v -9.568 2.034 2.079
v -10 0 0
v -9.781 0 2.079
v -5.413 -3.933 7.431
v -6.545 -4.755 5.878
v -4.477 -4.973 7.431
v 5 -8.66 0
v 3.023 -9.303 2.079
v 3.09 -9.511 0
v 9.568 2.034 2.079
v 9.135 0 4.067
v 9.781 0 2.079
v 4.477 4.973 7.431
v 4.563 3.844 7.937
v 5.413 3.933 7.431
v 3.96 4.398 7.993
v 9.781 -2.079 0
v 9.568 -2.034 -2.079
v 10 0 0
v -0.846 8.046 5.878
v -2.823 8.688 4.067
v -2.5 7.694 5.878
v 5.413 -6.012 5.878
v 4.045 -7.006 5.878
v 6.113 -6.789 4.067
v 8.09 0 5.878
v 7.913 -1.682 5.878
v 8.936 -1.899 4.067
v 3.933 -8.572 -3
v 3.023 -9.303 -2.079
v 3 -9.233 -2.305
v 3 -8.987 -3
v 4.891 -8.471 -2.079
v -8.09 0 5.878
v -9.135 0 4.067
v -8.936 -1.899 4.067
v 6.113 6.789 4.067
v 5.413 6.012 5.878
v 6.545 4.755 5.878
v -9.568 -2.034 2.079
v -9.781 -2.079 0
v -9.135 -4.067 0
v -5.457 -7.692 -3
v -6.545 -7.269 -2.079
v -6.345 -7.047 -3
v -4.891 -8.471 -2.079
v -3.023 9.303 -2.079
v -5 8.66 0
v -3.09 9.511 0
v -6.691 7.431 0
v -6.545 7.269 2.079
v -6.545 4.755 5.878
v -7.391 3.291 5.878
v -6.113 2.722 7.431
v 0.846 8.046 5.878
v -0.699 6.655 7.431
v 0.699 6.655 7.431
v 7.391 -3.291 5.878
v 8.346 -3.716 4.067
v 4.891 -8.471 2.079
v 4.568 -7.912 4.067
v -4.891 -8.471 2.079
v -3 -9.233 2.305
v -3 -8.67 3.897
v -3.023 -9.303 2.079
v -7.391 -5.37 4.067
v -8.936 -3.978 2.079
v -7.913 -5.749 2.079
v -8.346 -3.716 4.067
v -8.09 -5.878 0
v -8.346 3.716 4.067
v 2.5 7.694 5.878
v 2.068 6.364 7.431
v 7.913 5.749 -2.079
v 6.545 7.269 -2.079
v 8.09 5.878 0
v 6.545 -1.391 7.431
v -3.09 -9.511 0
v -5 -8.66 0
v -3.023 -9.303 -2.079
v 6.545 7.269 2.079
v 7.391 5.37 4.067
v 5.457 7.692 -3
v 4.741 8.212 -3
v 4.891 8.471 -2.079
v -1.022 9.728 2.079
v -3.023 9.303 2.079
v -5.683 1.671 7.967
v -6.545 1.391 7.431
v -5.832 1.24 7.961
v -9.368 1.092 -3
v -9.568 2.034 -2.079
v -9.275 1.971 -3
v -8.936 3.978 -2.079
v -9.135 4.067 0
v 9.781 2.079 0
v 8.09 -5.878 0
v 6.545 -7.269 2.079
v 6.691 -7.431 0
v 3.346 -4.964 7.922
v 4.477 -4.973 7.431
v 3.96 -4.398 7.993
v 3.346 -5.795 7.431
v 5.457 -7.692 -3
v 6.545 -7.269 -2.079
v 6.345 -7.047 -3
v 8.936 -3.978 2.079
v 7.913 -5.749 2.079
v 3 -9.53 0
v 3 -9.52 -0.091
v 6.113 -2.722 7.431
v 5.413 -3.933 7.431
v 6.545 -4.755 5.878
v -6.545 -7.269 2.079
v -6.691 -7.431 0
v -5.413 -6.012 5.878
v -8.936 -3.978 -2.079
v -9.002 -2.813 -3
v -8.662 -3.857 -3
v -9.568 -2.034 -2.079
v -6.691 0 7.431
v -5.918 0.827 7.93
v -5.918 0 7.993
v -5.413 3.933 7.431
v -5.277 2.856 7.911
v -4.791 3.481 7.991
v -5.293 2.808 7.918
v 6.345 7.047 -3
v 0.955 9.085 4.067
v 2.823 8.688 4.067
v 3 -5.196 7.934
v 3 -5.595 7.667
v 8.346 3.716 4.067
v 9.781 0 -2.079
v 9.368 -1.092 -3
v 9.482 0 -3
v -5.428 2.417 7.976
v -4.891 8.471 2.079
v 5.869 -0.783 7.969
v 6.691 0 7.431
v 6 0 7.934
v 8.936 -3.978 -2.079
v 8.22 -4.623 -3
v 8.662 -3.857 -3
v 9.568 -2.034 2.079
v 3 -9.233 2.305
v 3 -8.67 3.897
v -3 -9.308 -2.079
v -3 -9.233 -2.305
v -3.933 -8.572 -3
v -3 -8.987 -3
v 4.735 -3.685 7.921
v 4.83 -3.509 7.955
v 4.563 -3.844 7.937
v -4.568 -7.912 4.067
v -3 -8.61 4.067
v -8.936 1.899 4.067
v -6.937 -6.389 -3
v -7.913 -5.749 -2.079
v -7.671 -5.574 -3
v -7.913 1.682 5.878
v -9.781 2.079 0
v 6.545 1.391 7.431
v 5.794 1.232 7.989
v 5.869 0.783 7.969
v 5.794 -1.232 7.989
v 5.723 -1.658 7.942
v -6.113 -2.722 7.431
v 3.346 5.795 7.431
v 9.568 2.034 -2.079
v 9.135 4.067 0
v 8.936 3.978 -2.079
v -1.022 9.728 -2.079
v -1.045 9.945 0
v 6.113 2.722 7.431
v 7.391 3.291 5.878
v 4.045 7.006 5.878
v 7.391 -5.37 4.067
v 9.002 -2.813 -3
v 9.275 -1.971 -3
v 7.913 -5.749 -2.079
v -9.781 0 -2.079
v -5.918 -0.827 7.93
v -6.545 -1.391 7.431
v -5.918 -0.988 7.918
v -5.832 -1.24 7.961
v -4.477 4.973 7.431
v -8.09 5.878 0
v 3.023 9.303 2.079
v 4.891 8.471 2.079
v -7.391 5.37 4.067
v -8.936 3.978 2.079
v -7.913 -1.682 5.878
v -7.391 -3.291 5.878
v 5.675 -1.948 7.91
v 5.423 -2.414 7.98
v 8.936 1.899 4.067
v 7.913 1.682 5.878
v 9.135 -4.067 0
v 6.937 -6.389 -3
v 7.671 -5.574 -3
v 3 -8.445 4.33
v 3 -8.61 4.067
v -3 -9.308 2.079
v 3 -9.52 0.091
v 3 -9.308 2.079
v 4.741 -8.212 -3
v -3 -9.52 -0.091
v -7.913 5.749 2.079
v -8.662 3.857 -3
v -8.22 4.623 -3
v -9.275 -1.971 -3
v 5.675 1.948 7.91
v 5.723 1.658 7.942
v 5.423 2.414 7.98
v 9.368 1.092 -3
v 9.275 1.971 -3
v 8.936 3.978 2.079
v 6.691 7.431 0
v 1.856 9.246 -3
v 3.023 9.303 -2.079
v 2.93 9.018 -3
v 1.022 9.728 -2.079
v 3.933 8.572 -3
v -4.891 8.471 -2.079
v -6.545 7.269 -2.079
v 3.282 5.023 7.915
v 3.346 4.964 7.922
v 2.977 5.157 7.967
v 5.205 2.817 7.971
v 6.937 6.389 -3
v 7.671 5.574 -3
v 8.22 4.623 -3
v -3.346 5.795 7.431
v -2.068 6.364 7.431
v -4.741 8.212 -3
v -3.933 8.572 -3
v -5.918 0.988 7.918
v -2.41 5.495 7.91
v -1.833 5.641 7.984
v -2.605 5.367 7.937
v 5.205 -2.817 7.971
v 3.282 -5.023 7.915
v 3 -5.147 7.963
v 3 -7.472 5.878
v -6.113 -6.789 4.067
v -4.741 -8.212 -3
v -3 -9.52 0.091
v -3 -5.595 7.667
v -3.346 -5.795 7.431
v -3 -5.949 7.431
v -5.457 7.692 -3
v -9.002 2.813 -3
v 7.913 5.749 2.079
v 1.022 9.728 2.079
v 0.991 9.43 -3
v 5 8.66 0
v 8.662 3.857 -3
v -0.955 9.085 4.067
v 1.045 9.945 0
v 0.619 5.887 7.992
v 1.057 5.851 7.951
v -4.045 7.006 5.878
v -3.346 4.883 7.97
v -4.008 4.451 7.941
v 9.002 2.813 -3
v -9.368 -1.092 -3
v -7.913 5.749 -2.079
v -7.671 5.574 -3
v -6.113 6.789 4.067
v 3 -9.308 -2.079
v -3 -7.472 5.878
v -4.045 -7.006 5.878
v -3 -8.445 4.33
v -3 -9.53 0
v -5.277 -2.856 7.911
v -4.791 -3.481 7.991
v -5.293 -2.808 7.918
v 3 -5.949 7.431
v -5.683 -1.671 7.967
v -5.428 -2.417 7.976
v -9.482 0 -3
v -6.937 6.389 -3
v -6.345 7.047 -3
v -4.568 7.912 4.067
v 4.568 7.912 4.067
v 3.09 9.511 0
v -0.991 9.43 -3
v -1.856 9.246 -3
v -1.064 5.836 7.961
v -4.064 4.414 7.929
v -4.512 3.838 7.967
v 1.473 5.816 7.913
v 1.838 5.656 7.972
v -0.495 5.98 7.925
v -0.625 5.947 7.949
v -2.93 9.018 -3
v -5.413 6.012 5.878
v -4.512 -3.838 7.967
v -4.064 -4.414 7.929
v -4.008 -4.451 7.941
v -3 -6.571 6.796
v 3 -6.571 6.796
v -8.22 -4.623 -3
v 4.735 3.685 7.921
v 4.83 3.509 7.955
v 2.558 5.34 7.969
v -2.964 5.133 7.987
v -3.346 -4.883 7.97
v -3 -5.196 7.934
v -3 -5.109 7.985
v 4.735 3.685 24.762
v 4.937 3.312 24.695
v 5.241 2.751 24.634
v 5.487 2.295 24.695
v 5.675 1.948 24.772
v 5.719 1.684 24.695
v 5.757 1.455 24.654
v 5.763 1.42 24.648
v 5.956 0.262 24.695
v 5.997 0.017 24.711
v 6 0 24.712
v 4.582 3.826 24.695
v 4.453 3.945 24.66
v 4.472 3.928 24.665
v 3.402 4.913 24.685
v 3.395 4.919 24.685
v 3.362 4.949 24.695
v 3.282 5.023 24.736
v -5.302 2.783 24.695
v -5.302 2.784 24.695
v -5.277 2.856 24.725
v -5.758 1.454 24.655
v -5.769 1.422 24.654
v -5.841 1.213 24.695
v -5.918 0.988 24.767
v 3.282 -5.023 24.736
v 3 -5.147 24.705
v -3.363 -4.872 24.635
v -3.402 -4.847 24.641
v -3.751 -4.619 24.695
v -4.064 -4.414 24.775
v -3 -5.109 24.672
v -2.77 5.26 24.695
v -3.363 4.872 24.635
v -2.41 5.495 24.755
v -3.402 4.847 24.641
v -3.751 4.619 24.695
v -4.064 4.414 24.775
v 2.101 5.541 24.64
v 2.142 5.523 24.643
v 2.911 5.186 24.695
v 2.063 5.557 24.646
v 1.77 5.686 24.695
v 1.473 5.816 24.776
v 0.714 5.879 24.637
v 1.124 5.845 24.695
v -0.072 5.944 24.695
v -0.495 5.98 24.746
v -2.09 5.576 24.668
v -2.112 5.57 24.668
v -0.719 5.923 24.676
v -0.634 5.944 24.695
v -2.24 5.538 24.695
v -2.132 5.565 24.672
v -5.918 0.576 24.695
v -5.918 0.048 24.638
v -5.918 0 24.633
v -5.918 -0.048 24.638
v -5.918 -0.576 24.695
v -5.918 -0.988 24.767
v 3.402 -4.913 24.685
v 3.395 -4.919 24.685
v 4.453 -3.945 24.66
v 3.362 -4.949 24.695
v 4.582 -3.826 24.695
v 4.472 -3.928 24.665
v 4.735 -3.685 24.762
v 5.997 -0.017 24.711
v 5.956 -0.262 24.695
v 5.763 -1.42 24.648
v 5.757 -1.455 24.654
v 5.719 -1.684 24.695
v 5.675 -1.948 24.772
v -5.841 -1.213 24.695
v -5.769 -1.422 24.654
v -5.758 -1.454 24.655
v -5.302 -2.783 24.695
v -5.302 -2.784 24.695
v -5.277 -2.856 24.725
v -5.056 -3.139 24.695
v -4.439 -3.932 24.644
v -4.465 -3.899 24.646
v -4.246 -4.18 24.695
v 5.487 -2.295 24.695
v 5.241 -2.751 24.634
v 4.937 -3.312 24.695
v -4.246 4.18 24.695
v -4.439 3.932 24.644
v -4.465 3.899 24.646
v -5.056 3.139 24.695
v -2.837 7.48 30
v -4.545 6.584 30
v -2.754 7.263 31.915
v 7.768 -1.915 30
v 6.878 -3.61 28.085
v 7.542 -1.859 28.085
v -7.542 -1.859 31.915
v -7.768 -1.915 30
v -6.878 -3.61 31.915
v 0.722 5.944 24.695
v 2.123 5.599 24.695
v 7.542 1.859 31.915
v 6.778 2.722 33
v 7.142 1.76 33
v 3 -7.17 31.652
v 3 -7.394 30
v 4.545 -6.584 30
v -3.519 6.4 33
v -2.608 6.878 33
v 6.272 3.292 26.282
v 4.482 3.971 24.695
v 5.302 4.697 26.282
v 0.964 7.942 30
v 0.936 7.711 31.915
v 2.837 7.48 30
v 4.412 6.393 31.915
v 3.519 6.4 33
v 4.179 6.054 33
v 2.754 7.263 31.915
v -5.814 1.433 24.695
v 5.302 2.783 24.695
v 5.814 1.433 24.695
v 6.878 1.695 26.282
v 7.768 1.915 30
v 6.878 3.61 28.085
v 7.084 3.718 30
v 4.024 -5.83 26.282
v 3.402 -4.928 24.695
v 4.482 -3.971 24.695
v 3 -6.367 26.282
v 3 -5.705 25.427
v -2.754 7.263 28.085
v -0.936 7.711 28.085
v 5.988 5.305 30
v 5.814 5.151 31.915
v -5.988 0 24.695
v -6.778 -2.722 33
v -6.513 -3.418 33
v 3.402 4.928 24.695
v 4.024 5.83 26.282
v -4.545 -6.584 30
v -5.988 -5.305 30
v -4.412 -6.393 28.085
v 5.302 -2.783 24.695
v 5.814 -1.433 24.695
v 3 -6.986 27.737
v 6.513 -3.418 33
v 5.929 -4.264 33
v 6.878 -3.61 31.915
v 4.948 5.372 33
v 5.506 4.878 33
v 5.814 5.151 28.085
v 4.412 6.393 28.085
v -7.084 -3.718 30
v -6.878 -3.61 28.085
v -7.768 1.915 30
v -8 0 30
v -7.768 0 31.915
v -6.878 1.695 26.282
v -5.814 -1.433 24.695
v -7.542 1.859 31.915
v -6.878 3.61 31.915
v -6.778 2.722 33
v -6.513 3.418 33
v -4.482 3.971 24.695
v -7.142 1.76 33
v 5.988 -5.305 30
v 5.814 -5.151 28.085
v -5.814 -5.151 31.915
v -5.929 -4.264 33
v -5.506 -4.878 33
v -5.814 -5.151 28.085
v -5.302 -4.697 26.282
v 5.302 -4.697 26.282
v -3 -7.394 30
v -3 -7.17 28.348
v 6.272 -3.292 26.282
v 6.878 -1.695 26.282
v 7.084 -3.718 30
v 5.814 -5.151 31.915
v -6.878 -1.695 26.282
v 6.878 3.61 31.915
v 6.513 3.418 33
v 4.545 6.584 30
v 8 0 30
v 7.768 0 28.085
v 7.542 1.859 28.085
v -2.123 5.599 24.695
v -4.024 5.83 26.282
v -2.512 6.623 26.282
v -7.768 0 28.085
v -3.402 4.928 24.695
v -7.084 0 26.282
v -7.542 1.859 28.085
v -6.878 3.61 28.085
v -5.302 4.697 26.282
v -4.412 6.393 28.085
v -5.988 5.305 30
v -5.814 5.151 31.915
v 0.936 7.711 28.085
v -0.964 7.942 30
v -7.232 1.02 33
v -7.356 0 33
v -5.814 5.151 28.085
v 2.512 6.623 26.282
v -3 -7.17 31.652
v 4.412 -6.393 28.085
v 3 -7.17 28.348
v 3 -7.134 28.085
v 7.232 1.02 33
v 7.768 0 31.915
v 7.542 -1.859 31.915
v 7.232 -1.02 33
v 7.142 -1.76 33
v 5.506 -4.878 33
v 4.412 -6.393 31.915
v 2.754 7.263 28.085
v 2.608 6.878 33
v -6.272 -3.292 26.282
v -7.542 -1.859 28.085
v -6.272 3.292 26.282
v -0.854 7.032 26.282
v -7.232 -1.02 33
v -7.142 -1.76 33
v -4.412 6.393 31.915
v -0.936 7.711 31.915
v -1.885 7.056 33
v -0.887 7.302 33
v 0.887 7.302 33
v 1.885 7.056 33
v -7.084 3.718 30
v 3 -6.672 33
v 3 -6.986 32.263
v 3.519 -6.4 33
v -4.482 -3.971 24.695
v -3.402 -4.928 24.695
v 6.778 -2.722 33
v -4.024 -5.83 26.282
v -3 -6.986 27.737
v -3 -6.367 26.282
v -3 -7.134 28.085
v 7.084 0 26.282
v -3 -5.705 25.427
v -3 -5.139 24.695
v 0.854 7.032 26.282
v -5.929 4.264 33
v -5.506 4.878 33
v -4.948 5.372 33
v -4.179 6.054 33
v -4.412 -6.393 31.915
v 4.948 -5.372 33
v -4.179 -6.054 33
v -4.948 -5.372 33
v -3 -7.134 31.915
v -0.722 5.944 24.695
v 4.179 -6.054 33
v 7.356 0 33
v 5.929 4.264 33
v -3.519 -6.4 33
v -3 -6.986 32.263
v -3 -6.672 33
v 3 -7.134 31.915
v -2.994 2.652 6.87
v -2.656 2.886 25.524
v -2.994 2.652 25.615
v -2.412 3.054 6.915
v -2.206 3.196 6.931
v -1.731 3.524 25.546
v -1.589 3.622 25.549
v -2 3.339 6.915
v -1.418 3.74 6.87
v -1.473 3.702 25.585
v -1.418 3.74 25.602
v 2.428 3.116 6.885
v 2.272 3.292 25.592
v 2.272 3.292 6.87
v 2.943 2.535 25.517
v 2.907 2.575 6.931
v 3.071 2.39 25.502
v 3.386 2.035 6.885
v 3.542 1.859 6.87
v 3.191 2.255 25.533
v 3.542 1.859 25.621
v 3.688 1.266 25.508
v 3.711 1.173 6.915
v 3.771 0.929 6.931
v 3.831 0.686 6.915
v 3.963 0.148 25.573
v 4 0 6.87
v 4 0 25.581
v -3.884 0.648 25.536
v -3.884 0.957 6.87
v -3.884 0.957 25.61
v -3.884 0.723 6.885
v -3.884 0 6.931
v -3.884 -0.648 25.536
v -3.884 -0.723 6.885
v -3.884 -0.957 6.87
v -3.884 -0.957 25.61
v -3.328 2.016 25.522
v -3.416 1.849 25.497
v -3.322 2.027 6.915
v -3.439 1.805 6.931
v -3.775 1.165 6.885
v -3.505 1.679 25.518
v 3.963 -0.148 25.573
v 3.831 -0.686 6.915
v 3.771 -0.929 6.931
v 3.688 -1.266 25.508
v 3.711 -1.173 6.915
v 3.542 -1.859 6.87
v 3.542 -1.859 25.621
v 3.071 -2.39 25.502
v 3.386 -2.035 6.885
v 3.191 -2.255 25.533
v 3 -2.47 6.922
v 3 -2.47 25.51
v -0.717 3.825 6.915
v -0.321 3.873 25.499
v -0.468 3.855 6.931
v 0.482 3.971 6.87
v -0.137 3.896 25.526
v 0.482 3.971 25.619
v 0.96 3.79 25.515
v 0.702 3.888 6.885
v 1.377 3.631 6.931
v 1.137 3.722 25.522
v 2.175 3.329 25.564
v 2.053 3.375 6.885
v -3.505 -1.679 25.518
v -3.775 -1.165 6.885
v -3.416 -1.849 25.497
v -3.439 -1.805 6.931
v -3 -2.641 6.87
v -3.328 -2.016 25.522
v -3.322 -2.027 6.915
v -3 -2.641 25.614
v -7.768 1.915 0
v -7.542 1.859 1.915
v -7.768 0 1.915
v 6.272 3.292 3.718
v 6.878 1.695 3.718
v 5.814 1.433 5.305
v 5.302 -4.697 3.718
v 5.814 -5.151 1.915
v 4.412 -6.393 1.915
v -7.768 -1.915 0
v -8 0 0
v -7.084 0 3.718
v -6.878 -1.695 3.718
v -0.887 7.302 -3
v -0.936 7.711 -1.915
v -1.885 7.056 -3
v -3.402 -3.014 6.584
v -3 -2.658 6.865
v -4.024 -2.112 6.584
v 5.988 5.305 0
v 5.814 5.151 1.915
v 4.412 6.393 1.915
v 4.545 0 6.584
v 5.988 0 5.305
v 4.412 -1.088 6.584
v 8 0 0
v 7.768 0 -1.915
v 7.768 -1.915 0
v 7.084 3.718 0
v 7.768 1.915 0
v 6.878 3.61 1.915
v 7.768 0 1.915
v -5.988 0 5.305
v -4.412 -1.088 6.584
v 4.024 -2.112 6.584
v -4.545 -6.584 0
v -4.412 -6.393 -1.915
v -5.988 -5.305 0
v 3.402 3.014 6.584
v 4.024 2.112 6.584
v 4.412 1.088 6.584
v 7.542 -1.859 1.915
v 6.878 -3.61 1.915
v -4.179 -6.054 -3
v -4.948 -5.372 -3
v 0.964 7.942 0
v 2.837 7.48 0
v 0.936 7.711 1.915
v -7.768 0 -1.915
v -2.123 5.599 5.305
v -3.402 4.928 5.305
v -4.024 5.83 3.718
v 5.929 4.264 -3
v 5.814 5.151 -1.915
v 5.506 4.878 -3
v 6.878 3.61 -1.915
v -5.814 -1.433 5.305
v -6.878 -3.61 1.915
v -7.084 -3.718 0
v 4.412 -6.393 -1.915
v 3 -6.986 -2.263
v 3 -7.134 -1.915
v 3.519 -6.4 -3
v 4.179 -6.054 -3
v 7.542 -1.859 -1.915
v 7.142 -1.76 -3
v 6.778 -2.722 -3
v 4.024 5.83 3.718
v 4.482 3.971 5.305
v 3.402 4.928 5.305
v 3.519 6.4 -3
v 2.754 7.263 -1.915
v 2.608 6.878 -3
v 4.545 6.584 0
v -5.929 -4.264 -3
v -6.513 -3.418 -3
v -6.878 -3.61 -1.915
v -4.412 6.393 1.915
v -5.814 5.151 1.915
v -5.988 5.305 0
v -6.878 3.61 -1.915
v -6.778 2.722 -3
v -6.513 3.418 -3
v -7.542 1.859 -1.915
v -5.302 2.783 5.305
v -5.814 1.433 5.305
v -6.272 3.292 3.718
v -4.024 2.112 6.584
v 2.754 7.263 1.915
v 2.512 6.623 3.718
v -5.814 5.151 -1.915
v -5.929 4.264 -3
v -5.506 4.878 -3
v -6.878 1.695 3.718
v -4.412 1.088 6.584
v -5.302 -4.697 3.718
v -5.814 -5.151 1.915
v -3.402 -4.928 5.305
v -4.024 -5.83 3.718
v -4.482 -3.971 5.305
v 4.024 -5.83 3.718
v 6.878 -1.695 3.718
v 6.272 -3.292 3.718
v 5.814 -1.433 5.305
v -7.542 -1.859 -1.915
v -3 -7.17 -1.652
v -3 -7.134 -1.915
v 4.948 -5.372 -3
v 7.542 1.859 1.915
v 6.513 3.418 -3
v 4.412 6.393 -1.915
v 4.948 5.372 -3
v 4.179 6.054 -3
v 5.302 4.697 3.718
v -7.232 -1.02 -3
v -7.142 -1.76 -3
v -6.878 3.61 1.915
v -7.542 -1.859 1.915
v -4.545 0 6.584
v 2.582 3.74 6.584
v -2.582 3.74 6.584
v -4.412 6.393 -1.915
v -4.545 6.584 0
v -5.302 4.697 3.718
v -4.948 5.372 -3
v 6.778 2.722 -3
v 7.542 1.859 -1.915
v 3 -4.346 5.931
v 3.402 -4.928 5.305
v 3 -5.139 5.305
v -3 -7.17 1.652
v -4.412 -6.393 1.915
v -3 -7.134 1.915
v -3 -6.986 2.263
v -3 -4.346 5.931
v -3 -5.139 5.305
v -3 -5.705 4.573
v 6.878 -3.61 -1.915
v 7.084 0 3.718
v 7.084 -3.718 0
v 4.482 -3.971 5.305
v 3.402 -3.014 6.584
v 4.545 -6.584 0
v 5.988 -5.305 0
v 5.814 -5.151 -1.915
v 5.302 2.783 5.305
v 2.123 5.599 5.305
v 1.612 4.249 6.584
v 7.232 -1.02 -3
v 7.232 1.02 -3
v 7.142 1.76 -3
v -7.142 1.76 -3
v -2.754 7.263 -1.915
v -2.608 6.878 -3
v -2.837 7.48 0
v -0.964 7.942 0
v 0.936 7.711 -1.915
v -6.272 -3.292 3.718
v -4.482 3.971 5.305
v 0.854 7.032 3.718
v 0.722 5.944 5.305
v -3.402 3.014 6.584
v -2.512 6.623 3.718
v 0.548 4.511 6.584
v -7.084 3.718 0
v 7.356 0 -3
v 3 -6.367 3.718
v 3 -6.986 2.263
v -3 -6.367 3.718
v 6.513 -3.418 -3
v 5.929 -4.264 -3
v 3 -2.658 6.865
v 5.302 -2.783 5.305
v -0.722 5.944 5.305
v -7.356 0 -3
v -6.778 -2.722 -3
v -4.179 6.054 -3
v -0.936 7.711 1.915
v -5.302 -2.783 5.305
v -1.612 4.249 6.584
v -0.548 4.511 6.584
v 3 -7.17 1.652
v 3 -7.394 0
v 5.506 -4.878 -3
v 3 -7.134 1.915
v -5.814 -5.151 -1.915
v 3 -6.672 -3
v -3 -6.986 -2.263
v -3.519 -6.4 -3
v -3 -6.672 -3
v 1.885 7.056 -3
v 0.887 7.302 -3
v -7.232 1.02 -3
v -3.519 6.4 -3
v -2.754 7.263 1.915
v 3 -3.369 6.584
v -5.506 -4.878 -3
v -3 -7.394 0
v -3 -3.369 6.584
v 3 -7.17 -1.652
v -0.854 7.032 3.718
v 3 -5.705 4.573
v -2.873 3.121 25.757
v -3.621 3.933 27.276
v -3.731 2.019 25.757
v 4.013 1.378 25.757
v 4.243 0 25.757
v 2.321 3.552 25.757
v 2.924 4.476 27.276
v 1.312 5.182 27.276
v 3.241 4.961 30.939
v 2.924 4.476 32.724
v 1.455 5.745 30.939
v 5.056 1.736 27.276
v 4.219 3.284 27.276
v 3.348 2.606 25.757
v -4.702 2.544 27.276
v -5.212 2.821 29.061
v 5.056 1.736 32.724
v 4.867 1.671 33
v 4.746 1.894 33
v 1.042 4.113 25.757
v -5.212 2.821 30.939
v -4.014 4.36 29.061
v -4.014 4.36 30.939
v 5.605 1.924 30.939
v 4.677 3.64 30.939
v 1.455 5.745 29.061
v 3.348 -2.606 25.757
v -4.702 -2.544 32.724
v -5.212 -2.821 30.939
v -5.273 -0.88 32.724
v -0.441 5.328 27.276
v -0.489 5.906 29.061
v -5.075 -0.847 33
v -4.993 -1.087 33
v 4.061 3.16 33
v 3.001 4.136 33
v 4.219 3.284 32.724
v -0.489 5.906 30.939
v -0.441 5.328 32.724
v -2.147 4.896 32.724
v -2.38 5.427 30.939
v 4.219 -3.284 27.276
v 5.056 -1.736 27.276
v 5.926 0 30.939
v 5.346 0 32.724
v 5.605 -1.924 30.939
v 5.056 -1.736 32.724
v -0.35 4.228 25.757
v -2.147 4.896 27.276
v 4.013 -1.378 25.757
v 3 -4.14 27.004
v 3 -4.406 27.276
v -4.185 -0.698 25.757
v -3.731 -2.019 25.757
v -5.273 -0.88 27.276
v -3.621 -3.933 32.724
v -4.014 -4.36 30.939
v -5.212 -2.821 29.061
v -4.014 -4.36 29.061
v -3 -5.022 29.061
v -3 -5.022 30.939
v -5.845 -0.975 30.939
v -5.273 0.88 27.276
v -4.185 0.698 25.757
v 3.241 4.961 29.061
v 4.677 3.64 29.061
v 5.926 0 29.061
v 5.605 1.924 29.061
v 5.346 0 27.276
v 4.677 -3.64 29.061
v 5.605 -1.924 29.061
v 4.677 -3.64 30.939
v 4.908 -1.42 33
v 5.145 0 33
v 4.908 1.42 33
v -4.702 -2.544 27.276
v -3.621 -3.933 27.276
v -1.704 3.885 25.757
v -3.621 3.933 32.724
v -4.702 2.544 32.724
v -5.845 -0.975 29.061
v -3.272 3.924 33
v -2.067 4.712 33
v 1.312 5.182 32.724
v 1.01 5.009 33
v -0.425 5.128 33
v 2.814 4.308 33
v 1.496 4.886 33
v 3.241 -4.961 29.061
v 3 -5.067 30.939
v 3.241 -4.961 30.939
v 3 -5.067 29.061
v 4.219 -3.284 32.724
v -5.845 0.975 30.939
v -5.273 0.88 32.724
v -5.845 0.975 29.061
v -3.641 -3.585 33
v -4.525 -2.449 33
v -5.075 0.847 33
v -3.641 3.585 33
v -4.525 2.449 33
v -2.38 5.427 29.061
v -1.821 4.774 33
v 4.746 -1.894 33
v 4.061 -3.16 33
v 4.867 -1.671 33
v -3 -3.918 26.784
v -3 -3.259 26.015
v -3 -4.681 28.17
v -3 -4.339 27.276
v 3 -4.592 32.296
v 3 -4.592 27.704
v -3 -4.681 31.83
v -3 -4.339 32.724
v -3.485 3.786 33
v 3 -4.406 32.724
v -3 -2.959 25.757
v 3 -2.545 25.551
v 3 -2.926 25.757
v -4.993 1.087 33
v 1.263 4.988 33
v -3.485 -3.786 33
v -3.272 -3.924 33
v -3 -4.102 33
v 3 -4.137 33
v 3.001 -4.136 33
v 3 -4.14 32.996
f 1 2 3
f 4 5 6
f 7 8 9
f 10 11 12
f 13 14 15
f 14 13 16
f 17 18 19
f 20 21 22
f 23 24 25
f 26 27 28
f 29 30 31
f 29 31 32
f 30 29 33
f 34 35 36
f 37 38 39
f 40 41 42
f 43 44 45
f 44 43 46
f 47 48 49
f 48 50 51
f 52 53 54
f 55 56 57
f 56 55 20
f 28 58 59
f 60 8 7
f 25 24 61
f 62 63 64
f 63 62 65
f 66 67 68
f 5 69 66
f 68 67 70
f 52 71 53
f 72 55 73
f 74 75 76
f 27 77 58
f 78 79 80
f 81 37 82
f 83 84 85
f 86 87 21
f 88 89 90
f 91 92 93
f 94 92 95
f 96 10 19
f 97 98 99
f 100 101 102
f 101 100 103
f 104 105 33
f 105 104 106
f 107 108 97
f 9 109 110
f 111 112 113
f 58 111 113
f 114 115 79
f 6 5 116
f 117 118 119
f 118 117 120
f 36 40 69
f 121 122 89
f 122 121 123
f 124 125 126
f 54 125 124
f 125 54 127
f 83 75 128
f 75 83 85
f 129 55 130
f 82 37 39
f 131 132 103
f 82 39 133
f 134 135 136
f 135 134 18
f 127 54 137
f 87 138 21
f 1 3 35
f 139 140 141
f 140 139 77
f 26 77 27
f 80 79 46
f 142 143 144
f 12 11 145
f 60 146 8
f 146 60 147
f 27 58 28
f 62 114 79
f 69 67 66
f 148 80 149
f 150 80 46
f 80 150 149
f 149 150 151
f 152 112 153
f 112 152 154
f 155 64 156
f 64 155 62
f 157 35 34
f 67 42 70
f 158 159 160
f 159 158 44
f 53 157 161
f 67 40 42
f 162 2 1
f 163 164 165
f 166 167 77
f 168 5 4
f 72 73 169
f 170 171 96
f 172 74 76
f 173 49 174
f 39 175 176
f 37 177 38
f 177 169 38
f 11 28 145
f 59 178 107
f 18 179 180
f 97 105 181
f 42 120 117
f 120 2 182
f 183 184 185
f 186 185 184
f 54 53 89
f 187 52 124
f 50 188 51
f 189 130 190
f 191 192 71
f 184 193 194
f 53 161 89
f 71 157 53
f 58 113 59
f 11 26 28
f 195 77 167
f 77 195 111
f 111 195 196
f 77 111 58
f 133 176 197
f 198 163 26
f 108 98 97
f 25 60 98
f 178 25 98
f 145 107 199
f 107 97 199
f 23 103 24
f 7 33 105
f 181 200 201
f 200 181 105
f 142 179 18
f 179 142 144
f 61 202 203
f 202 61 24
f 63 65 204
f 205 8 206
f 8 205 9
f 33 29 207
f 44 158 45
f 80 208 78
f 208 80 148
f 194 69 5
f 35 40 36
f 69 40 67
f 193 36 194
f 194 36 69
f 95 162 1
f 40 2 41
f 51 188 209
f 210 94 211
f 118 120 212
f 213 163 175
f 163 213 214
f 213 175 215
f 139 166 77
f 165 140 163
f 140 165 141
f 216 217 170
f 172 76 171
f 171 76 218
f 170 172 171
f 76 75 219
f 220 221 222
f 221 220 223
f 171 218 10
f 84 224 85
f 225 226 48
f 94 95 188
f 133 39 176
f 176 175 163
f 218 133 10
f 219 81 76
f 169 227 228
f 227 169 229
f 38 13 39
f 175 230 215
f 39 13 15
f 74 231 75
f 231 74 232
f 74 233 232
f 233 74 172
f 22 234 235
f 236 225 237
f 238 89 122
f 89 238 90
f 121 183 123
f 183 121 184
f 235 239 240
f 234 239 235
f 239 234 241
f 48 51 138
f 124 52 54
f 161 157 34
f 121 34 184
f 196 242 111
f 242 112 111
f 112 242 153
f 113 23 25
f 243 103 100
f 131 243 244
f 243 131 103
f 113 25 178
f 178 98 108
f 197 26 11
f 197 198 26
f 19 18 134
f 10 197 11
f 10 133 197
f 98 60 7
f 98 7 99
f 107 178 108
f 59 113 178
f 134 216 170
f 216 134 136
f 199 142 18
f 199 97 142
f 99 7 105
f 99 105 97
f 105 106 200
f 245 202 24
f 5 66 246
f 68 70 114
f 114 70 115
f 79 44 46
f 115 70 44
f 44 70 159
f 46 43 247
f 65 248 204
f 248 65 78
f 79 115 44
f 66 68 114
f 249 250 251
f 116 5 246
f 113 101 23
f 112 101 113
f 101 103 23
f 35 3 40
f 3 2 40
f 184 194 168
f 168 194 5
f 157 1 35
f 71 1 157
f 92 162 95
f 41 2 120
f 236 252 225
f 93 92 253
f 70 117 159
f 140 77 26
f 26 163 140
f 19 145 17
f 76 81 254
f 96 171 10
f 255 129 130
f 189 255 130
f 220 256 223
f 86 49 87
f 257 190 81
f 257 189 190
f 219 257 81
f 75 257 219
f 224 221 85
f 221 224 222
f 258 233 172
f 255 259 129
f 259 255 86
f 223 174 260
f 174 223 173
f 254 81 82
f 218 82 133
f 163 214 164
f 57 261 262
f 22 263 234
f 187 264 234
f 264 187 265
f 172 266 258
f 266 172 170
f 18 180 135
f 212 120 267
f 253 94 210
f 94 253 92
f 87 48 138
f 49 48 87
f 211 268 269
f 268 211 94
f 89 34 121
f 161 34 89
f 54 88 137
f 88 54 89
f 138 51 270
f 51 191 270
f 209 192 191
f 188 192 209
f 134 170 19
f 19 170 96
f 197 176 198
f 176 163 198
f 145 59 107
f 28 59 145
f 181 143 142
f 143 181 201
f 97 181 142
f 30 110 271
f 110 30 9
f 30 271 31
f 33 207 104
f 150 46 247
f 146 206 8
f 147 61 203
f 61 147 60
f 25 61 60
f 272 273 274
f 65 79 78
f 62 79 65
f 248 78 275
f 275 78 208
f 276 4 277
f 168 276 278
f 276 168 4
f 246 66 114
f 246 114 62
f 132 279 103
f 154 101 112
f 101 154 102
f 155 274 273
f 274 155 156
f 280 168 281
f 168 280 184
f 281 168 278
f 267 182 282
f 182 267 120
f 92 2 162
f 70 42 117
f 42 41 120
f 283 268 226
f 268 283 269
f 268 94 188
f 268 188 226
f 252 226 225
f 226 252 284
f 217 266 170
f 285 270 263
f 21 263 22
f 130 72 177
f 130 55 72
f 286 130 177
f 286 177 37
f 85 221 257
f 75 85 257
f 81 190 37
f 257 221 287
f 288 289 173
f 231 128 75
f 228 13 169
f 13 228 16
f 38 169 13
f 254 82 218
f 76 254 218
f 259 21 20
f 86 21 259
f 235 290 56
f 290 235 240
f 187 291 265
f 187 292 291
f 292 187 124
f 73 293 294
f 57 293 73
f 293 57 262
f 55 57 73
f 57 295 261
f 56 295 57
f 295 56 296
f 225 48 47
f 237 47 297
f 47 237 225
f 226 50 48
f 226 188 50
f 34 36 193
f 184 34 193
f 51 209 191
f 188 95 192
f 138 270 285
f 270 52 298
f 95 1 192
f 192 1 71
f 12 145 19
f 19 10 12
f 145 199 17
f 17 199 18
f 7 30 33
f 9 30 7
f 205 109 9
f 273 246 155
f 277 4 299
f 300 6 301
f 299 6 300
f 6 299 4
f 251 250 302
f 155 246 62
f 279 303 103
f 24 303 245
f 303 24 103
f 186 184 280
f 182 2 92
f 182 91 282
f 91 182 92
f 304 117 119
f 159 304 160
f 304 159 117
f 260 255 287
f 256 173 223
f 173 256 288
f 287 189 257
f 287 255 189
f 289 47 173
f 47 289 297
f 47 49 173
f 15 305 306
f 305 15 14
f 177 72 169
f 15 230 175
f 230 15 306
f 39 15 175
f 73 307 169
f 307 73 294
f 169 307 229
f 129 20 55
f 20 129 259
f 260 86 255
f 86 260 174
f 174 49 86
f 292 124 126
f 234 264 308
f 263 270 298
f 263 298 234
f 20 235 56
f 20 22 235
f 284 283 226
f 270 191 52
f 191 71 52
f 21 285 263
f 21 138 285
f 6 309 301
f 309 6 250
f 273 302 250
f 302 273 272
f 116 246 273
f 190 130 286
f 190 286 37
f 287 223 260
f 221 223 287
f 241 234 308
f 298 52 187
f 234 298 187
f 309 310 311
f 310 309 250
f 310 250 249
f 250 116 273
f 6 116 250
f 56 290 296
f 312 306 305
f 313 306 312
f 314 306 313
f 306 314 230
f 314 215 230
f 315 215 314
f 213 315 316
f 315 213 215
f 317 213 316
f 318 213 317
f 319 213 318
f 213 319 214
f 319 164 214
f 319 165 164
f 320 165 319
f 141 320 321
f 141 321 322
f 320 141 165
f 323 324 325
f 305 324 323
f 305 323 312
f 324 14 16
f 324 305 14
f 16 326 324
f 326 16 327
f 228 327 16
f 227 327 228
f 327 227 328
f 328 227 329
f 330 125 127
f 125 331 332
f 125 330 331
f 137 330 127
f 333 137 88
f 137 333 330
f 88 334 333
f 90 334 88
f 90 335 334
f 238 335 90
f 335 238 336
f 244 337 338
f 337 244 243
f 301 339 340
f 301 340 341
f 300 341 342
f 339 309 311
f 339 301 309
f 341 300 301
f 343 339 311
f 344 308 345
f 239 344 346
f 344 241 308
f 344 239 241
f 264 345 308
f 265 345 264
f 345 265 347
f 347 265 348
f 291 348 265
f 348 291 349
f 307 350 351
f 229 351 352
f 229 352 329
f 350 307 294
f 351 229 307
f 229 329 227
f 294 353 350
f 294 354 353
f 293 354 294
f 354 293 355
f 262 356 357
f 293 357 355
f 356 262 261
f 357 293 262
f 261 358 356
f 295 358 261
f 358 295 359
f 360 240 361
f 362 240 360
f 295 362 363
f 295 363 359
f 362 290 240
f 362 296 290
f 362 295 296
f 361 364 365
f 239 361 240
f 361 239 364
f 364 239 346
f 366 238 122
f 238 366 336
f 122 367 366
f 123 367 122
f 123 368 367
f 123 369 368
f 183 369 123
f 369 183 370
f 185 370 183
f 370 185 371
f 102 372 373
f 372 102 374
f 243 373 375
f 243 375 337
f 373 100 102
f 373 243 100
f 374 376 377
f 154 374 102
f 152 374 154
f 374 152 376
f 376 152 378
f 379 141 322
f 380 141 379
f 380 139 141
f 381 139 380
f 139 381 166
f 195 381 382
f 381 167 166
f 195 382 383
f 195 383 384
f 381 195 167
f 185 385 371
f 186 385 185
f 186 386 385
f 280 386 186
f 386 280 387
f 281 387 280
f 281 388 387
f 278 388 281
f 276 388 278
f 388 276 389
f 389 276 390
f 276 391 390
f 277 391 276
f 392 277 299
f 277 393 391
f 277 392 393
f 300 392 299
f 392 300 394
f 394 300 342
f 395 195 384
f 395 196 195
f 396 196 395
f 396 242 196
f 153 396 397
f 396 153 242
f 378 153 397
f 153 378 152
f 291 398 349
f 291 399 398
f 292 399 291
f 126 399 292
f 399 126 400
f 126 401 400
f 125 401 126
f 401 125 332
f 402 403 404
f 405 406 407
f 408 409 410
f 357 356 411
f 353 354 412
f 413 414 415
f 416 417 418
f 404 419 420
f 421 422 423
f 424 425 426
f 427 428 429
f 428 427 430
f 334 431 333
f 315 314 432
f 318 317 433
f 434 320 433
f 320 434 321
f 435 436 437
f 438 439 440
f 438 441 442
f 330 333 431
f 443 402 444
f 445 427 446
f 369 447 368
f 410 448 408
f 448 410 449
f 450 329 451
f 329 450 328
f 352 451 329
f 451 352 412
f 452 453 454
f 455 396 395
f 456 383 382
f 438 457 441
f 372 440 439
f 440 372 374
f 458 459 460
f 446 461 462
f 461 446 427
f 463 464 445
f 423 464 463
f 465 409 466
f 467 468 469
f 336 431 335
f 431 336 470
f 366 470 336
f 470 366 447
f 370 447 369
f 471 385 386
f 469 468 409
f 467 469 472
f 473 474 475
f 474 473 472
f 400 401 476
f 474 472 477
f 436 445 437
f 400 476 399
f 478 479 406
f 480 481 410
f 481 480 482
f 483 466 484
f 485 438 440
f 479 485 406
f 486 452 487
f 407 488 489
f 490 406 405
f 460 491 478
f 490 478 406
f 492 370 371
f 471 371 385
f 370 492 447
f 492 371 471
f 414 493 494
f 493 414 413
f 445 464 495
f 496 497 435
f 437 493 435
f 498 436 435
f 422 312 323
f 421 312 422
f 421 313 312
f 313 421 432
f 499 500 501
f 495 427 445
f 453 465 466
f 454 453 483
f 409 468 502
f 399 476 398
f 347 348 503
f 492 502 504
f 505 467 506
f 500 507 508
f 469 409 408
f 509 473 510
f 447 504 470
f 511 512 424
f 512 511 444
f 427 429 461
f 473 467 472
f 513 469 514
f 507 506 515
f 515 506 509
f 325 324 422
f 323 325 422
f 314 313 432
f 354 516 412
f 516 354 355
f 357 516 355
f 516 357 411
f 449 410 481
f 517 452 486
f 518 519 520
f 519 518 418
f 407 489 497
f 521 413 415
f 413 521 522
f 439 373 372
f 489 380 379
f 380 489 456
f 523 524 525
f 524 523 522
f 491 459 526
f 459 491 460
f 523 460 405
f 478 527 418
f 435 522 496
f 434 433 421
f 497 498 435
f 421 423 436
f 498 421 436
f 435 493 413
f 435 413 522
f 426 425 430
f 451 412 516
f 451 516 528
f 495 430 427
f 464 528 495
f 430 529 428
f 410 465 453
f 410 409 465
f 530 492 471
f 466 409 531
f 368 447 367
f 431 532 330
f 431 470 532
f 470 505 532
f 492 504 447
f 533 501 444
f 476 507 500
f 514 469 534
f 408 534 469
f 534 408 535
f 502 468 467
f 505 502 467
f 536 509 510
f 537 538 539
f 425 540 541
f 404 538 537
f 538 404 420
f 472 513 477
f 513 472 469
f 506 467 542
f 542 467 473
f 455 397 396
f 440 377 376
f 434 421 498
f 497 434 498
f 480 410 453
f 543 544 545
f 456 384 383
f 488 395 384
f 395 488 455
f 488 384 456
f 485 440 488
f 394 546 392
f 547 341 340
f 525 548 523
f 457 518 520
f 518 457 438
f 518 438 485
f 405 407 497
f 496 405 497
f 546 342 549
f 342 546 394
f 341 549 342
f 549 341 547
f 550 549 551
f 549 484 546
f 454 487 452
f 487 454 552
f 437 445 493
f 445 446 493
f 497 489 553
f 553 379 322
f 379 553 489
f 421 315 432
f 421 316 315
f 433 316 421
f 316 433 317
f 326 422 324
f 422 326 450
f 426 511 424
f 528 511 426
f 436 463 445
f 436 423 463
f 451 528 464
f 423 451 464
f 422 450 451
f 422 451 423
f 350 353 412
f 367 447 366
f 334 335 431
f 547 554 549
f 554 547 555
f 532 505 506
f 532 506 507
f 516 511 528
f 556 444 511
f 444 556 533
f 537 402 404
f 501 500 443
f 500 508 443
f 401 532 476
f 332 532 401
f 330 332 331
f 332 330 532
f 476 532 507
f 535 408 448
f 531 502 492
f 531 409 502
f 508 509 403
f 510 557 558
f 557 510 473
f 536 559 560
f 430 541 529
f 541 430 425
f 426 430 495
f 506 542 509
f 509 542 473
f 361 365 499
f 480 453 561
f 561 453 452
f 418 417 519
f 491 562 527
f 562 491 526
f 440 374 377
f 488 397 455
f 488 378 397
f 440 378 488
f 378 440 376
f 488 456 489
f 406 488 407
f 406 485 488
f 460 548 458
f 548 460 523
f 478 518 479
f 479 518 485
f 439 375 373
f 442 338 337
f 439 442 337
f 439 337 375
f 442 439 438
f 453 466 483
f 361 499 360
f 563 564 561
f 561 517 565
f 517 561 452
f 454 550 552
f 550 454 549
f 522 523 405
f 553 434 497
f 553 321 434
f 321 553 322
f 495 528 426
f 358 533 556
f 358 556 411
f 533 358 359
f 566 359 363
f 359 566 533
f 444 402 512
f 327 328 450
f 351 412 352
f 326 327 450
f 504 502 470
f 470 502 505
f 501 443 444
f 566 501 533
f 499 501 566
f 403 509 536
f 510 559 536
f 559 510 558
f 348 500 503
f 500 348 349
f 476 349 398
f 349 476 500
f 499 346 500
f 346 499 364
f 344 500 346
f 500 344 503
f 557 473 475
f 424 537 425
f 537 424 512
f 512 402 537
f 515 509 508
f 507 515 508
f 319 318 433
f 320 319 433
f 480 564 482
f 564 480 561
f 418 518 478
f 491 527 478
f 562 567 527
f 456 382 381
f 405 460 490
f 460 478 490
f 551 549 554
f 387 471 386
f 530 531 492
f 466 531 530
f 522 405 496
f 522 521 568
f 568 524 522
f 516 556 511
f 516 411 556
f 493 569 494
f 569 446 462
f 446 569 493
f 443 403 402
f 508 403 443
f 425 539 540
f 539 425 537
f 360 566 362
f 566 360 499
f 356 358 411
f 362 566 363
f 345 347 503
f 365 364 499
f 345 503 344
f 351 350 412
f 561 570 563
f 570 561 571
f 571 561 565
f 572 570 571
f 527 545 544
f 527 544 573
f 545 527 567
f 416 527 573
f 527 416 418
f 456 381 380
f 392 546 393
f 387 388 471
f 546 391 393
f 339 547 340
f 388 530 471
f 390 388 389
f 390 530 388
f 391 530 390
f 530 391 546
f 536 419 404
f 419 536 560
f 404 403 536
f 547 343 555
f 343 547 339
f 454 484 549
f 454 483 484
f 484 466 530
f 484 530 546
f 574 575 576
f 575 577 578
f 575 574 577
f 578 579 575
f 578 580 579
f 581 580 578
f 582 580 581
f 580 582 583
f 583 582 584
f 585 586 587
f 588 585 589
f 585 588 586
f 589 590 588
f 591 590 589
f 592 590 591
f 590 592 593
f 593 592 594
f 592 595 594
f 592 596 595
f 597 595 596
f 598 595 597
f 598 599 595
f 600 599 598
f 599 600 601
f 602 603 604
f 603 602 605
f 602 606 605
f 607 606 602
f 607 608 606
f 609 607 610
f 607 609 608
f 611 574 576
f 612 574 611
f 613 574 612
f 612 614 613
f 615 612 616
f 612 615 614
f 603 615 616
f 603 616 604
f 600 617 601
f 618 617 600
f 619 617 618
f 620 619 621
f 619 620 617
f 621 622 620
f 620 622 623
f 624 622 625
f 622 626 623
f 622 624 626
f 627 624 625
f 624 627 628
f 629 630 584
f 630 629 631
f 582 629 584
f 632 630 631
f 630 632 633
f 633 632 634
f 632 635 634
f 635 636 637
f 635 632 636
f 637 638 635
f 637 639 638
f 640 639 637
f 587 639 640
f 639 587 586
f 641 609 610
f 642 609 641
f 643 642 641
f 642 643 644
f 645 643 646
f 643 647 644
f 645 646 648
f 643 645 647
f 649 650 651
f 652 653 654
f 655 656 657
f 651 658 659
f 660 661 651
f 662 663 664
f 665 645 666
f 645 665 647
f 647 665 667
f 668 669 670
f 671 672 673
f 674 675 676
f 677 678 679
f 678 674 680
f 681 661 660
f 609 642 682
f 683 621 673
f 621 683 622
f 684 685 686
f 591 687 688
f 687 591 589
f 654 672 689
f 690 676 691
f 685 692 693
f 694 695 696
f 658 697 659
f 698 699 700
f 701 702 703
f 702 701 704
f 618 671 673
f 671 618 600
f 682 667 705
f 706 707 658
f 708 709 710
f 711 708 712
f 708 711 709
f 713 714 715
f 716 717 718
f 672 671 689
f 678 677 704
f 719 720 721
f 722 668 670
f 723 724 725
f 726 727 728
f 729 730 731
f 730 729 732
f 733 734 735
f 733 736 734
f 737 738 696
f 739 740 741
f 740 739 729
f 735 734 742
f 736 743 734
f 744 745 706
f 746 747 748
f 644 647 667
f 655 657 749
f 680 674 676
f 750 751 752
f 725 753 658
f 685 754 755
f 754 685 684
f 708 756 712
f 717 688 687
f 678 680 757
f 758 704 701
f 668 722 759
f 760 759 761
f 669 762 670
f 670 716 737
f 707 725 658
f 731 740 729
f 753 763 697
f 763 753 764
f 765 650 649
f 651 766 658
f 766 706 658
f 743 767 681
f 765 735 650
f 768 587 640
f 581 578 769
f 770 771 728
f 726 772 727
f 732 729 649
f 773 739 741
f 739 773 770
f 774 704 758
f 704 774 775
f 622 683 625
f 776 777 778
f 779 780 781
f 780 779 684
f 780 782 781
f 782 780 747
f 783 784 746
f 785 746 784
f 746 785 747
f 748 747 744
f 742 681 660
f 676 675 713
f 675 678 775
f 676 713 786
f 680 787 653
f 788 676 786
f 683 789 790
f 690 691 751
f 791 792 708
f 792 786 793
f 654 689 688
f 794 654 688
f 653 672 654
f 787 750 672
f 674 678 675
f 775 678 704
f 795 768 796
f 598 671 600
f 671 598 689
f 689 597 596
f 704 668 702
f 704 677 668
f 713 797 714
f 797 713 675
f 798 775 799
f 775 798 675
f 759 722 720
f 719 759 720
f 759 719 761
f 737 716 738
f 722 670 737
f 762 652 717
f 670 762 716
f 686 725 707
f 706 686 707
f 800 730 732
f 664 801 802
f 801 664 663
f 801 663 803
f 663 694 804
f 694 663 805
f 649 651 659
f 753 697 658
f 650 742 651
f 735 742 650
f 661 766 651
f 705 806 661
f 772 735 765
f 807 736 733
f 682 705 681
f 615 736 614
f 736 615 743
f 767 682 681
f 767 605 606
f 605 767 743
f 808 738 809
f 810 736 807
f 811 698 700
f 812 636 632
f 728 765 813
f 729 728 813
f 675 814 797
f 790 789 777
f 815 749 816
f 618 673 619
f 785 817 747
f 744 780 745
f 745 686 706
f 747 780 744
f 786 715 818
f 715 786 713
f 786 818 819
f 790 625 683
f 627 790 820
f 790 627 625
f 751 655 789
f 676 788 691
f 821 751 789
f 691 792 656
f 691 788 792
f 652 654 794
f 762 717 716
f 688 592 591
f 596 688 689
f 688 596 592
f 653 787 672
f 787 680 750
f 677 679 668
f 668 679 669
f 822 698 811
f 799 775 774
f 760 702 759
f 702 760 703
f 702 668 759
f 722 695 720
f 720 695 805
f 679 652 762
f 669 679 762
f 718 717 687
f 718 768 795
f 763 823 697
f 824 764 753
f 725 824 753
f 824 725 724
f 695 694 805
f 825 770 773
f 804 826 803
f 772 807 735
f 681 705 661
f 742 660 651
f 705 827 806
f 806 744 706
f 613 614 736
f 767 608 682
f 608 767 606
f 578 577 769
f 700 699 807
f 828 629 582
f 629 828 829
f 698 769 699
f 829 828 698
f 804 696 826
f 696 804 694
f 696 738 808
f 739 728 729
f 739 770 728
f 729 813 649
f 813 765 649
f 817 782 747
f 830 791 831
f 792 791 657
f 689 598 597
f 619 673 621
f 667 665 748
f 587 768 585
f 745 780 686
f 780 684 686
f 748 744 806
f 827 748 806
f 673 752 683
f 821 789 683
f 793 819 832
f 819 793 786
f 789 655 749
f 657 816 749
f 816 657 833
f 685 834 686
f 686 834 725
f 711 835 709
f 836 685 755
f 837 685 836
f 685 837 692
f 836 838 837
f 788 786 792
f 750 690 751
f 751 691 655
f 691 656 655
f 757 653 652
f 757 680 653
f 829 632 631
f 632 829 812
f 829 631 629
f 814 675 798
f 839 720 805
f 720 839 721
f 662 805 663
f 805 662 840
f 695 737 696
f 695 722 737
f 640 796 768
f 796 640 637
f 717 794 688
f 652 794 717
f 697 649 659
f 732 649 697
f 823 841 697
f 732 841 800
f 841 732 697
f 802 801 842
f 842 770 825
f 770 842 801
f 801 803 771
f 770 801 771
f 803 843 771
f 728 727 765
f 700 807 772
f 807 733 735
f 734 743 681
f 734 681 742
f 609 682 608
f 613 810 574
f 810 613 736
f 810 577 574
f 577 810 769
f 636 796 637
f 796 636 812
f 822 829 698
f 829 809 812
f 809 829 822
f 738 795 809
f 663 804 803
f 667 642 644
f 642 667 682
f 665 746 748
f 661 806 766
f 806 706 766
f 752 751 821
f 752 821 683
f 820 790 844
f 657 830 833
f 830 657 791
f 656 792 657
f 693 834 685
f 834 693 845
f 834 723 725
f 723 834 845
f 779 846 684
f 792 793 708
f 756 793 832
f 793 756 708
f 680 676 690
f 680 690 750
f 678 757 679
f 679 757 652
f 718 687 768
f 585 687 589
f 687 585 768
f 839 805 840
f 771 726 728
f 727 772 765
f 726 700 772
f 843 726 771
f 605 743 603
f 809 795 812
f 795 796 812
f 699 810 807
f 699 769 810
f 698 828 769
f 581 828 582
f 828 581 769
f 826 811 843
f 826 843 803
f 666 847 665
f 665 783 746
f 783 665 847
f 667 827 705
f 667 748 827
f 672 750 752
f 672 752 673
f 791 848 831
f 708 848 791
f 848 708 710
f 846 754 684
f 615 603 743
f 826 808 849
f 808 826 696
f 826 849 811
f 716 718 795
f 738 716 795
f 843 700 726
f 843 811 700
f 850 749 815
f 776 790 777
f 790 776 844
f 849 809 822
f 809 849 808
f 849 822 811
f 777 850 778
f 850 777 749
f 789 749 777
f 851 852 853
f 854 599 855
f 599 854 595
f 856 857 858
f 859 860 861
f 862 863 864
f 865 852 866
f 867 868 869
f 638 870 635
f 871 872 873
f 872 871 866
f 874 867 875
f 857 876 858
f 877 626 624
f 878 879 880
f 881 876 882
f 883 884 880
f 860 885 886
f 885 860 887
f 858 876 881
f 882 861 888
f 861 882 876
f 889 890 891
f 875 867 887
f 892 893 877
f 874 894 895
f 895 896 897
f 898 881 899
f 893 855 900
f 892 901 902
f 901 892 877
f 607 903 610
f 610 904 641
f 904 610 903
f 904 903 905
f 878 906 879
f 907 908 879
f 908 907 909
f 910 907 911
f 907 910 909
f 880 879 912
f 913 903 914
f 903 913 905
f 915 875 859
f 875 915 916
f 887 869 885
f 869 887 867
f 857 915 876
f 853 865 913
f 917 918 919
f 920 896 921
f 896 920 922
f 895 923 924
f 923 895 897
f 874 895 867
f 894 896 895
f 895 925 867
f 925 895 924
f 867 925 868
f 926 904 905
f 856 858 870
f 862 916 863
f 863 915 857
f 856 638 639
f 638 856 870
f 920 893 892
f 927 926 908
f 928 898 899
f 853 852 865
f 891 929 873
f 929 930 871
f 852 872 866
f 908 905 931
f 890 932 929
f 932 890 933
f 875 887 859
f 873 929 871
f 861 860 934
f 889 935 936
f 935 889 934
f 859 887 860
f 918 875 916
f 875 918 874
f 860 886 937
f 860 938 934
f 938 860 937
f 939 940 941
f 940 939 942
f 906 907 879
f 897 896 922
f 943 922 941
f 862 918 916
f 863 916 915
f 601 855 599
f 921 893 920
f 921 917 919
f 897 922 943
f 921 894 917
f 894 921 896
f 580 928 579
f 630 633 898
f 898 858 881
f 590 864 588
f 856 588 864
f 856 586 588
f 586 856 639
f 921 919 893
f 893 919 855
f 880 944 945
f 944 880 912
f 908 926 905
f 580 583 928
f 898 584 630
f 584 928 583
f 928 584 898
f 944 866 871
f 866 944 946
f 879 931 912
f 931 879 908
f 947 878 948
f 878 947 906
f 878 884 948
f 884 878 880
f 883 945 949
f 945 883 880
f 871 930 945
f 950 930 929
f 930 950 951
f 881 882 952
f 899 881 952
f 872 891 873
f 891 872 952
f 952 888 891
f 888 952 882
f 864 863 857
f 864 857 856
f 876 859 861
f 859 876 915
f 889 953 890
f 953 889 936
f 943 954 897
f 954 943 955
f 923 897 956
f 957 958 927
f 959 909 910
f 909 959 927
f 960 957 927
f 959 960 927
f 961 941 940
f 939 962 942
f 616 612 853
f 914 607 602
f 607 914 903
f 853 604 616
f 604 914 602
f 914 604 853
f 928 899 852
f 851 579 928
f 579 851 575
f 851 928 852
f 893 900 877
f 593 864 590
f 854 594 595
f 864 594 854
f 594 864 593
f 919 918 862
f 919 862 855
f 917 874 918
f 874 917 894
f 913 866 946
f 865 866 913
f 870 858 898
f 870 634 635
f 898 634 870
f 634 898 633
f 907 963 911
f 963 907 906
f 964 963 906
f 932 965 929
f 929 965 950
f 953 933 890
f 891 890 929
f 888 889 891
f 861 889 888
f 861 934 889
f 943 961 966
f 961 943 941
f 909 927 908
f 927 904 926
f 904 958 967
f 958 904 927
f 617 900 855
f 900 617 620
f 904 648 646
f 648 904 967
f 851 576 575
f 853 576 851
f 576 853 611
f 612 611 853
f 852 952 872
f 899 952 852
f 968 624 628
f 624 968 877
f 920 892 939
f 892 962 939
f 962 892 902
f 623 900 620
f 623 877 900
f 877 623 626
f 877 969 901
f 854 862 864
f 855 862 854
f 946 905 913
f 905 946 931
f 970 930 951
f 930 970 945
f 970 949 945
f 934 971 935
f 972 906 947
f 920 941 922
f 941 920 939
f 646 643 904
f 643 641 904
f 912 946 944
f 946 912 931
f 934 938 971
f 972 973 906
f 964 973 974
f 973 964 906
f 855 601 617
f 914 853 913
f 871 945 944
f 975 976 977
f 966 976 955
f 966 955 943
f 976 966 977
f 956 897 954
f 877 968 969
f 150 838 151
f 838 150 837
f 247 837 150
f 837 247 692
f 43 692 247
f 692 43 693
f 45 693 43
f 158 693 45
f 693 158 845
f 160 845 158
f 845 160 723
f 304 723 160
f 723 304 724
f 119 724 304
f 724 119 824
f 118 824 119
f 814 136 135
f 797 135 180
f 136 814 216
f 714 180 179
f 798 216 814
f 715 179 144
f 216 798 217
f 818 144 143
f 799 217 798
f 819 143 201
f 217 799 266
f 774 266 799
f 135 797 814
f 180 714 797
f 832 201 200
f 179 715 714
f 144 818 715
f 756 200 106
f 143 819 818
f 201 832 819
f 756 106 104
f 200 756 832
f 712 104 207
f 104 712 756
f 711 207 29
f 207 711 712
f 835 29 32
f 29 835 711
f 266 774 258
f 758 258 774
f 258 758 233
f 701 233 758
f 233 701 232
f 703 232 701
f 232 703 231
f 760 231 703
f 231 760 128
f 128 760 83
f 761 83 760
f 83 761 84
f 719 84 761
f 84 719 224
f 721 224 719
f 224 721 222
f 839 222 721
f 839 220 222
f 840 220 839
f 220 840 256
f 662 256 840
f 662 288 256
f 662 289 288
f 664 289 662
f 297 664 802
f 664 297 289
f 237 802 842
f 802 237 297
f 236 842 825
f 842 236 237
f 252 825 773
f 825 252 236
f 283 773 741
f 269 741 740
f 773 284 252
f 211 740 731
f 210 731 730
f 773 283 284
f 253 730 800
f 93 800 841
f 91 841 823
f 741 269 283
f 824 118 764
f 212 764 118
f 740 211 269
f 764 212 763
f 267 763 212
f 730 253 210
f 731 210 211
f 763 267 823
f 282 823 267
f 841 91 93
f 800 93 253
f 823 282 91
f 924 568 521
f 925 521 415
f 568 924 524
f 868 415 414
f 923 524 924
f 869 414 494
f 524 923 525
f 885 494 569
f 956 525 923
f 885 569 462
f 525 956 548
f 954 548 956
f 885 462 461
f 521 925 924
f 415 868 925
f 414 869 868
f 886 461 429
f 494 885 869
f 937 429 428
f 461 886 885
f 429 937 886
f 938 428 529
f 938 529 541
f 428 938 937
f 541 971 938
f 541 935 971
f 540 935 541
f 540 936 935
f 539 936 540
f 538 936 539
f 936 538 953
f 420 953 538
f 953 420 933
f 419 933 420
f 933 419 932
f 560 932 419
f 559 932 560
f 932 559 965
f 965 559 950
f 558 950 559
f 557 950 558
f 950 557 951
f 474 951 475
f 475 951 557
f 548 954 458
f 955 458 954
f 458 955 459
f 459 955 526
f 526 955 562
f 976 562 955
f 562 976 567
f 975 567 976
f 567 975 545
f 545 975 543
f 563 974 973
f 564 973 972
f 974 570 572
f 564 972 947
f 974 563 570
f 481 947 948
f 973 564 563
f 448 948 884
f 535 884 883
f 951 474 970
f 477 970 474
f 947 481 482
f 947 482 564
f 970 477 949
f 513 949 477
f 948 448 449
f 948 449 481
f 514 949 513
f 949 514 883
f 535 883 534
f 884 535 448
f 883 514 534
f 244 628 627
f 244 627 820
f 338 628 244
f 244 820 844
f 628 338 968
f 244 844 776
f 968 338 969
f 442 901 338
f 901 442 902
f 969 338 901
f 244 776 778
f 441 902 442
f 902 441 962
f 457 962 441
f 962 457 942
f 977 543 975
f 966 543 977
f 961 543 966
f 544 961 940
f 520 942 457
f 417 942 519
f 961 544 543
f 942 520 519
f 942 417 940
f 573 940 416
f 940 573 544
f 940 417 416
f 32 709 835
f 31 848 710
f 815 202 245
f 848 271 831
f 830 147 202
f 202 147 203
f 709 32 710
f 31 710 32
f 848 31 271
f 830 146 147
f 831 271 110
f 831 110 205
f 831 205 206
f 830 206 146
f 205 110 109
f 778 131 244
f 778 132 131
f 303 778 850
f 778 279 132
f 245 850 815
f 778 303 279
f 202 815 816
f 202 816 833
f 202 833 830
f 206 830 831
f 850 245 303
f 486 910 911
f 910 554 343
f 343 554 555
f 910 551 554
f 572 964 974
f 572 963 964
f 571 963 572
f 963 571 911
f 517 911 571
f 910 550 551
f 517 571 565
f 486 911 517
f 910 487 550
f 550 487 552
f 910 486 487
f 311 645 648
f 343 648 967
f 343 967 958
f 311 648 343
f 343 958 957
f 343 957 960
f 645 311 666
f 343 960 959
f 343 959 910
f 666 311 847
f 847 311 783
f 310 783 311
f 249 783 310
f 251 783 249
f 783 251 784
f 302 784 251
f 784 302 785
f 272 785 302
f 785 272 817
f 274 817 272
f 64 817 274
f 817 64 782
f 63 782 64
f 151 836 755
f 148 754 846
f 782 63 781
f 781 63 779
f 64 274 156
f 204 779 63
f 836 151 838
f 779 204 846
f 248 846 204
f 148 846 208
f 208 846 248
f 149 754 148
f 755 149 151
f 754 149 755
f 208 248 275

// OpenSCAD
//This is the height from the center of the large ball to the cente of the small ball, not the overall height of the object.
//Height of the shaft, not the full object
height=30; //[10:50]

//This is the reidus of the inner pipe (The amount of space you have to run cables.
//Inner Pipe radius
inner_pipe_radius=4;//[2:10] 

//This is the outer raidus of the small joint and the inner raidus of the outter joint.
//Outer joint size of the small ball joint and inner joint size of the large ball joint.
large_joint_inner_radius=8;//[4:12]

// How thick are the walls.
// Thickness of the walls
thickness=2;//[1:5]

difference(){
	union(){
		//The large ball joint, outter
		sphere(large_joint_inner_radius+thickness);

		//The outter shaft
		cylinder(h=height,r=inner_pipe_radius+thickness);

		//The small ball joint, outter
		translate([0,0,height]) sphere(large_joint_inner_radius);
	}

	//This cuts the inner pipe.  The place for the cables
	cylinder(h=height,r=inner_pipe_radius);
	
	//This cuts the inner part of the large ball joint
	sphere(large_joint_inner_radius);

	//This cuts the inner part of the small ball joint
	translate([0,0,height]) sphere(large_joint_inner_radius-thickness);

	//This cuts the bottom of the large outter joint
	translate([-large_joint_inner_radius-thickness,-large_joint_inner_radius-thickness,-large_joint_inner_radius-thickness]) cube([(large_joint_inner_radius+thickness)*2,(large_joint_inner_radius+thickness)*2,(large_joint_inner_radius+thickness)*.7]);

	//This cuts the top of the small inner joint.  Needed a little more than calculated.  Needed to be a little more then calculated.
	translate([-large_joint_inner_radius,-large_joint_inner_radius,height+((large_joint_inner_radius+thickness)*.3)]) cube([large_joint_inner_radius*2,large_joint_inner_radius*2,(large_joint_inner_radius*2)]);
	
	//This is the slot
	translate([-inner_pipe_radius+(thickness/2),-large_joint_inner_radius-thickness,-large_joint_inner_radius-thickness]) cube([(inner_pipe_radius*2)-thickness,large_joint_inner_radius+thickness,height+((large_joint_inner_radius+thickness)*2)]) cube([((large_joint_inner_radius+thickness)*.7)+(large_joint_inner_radius*.7)]);
}
